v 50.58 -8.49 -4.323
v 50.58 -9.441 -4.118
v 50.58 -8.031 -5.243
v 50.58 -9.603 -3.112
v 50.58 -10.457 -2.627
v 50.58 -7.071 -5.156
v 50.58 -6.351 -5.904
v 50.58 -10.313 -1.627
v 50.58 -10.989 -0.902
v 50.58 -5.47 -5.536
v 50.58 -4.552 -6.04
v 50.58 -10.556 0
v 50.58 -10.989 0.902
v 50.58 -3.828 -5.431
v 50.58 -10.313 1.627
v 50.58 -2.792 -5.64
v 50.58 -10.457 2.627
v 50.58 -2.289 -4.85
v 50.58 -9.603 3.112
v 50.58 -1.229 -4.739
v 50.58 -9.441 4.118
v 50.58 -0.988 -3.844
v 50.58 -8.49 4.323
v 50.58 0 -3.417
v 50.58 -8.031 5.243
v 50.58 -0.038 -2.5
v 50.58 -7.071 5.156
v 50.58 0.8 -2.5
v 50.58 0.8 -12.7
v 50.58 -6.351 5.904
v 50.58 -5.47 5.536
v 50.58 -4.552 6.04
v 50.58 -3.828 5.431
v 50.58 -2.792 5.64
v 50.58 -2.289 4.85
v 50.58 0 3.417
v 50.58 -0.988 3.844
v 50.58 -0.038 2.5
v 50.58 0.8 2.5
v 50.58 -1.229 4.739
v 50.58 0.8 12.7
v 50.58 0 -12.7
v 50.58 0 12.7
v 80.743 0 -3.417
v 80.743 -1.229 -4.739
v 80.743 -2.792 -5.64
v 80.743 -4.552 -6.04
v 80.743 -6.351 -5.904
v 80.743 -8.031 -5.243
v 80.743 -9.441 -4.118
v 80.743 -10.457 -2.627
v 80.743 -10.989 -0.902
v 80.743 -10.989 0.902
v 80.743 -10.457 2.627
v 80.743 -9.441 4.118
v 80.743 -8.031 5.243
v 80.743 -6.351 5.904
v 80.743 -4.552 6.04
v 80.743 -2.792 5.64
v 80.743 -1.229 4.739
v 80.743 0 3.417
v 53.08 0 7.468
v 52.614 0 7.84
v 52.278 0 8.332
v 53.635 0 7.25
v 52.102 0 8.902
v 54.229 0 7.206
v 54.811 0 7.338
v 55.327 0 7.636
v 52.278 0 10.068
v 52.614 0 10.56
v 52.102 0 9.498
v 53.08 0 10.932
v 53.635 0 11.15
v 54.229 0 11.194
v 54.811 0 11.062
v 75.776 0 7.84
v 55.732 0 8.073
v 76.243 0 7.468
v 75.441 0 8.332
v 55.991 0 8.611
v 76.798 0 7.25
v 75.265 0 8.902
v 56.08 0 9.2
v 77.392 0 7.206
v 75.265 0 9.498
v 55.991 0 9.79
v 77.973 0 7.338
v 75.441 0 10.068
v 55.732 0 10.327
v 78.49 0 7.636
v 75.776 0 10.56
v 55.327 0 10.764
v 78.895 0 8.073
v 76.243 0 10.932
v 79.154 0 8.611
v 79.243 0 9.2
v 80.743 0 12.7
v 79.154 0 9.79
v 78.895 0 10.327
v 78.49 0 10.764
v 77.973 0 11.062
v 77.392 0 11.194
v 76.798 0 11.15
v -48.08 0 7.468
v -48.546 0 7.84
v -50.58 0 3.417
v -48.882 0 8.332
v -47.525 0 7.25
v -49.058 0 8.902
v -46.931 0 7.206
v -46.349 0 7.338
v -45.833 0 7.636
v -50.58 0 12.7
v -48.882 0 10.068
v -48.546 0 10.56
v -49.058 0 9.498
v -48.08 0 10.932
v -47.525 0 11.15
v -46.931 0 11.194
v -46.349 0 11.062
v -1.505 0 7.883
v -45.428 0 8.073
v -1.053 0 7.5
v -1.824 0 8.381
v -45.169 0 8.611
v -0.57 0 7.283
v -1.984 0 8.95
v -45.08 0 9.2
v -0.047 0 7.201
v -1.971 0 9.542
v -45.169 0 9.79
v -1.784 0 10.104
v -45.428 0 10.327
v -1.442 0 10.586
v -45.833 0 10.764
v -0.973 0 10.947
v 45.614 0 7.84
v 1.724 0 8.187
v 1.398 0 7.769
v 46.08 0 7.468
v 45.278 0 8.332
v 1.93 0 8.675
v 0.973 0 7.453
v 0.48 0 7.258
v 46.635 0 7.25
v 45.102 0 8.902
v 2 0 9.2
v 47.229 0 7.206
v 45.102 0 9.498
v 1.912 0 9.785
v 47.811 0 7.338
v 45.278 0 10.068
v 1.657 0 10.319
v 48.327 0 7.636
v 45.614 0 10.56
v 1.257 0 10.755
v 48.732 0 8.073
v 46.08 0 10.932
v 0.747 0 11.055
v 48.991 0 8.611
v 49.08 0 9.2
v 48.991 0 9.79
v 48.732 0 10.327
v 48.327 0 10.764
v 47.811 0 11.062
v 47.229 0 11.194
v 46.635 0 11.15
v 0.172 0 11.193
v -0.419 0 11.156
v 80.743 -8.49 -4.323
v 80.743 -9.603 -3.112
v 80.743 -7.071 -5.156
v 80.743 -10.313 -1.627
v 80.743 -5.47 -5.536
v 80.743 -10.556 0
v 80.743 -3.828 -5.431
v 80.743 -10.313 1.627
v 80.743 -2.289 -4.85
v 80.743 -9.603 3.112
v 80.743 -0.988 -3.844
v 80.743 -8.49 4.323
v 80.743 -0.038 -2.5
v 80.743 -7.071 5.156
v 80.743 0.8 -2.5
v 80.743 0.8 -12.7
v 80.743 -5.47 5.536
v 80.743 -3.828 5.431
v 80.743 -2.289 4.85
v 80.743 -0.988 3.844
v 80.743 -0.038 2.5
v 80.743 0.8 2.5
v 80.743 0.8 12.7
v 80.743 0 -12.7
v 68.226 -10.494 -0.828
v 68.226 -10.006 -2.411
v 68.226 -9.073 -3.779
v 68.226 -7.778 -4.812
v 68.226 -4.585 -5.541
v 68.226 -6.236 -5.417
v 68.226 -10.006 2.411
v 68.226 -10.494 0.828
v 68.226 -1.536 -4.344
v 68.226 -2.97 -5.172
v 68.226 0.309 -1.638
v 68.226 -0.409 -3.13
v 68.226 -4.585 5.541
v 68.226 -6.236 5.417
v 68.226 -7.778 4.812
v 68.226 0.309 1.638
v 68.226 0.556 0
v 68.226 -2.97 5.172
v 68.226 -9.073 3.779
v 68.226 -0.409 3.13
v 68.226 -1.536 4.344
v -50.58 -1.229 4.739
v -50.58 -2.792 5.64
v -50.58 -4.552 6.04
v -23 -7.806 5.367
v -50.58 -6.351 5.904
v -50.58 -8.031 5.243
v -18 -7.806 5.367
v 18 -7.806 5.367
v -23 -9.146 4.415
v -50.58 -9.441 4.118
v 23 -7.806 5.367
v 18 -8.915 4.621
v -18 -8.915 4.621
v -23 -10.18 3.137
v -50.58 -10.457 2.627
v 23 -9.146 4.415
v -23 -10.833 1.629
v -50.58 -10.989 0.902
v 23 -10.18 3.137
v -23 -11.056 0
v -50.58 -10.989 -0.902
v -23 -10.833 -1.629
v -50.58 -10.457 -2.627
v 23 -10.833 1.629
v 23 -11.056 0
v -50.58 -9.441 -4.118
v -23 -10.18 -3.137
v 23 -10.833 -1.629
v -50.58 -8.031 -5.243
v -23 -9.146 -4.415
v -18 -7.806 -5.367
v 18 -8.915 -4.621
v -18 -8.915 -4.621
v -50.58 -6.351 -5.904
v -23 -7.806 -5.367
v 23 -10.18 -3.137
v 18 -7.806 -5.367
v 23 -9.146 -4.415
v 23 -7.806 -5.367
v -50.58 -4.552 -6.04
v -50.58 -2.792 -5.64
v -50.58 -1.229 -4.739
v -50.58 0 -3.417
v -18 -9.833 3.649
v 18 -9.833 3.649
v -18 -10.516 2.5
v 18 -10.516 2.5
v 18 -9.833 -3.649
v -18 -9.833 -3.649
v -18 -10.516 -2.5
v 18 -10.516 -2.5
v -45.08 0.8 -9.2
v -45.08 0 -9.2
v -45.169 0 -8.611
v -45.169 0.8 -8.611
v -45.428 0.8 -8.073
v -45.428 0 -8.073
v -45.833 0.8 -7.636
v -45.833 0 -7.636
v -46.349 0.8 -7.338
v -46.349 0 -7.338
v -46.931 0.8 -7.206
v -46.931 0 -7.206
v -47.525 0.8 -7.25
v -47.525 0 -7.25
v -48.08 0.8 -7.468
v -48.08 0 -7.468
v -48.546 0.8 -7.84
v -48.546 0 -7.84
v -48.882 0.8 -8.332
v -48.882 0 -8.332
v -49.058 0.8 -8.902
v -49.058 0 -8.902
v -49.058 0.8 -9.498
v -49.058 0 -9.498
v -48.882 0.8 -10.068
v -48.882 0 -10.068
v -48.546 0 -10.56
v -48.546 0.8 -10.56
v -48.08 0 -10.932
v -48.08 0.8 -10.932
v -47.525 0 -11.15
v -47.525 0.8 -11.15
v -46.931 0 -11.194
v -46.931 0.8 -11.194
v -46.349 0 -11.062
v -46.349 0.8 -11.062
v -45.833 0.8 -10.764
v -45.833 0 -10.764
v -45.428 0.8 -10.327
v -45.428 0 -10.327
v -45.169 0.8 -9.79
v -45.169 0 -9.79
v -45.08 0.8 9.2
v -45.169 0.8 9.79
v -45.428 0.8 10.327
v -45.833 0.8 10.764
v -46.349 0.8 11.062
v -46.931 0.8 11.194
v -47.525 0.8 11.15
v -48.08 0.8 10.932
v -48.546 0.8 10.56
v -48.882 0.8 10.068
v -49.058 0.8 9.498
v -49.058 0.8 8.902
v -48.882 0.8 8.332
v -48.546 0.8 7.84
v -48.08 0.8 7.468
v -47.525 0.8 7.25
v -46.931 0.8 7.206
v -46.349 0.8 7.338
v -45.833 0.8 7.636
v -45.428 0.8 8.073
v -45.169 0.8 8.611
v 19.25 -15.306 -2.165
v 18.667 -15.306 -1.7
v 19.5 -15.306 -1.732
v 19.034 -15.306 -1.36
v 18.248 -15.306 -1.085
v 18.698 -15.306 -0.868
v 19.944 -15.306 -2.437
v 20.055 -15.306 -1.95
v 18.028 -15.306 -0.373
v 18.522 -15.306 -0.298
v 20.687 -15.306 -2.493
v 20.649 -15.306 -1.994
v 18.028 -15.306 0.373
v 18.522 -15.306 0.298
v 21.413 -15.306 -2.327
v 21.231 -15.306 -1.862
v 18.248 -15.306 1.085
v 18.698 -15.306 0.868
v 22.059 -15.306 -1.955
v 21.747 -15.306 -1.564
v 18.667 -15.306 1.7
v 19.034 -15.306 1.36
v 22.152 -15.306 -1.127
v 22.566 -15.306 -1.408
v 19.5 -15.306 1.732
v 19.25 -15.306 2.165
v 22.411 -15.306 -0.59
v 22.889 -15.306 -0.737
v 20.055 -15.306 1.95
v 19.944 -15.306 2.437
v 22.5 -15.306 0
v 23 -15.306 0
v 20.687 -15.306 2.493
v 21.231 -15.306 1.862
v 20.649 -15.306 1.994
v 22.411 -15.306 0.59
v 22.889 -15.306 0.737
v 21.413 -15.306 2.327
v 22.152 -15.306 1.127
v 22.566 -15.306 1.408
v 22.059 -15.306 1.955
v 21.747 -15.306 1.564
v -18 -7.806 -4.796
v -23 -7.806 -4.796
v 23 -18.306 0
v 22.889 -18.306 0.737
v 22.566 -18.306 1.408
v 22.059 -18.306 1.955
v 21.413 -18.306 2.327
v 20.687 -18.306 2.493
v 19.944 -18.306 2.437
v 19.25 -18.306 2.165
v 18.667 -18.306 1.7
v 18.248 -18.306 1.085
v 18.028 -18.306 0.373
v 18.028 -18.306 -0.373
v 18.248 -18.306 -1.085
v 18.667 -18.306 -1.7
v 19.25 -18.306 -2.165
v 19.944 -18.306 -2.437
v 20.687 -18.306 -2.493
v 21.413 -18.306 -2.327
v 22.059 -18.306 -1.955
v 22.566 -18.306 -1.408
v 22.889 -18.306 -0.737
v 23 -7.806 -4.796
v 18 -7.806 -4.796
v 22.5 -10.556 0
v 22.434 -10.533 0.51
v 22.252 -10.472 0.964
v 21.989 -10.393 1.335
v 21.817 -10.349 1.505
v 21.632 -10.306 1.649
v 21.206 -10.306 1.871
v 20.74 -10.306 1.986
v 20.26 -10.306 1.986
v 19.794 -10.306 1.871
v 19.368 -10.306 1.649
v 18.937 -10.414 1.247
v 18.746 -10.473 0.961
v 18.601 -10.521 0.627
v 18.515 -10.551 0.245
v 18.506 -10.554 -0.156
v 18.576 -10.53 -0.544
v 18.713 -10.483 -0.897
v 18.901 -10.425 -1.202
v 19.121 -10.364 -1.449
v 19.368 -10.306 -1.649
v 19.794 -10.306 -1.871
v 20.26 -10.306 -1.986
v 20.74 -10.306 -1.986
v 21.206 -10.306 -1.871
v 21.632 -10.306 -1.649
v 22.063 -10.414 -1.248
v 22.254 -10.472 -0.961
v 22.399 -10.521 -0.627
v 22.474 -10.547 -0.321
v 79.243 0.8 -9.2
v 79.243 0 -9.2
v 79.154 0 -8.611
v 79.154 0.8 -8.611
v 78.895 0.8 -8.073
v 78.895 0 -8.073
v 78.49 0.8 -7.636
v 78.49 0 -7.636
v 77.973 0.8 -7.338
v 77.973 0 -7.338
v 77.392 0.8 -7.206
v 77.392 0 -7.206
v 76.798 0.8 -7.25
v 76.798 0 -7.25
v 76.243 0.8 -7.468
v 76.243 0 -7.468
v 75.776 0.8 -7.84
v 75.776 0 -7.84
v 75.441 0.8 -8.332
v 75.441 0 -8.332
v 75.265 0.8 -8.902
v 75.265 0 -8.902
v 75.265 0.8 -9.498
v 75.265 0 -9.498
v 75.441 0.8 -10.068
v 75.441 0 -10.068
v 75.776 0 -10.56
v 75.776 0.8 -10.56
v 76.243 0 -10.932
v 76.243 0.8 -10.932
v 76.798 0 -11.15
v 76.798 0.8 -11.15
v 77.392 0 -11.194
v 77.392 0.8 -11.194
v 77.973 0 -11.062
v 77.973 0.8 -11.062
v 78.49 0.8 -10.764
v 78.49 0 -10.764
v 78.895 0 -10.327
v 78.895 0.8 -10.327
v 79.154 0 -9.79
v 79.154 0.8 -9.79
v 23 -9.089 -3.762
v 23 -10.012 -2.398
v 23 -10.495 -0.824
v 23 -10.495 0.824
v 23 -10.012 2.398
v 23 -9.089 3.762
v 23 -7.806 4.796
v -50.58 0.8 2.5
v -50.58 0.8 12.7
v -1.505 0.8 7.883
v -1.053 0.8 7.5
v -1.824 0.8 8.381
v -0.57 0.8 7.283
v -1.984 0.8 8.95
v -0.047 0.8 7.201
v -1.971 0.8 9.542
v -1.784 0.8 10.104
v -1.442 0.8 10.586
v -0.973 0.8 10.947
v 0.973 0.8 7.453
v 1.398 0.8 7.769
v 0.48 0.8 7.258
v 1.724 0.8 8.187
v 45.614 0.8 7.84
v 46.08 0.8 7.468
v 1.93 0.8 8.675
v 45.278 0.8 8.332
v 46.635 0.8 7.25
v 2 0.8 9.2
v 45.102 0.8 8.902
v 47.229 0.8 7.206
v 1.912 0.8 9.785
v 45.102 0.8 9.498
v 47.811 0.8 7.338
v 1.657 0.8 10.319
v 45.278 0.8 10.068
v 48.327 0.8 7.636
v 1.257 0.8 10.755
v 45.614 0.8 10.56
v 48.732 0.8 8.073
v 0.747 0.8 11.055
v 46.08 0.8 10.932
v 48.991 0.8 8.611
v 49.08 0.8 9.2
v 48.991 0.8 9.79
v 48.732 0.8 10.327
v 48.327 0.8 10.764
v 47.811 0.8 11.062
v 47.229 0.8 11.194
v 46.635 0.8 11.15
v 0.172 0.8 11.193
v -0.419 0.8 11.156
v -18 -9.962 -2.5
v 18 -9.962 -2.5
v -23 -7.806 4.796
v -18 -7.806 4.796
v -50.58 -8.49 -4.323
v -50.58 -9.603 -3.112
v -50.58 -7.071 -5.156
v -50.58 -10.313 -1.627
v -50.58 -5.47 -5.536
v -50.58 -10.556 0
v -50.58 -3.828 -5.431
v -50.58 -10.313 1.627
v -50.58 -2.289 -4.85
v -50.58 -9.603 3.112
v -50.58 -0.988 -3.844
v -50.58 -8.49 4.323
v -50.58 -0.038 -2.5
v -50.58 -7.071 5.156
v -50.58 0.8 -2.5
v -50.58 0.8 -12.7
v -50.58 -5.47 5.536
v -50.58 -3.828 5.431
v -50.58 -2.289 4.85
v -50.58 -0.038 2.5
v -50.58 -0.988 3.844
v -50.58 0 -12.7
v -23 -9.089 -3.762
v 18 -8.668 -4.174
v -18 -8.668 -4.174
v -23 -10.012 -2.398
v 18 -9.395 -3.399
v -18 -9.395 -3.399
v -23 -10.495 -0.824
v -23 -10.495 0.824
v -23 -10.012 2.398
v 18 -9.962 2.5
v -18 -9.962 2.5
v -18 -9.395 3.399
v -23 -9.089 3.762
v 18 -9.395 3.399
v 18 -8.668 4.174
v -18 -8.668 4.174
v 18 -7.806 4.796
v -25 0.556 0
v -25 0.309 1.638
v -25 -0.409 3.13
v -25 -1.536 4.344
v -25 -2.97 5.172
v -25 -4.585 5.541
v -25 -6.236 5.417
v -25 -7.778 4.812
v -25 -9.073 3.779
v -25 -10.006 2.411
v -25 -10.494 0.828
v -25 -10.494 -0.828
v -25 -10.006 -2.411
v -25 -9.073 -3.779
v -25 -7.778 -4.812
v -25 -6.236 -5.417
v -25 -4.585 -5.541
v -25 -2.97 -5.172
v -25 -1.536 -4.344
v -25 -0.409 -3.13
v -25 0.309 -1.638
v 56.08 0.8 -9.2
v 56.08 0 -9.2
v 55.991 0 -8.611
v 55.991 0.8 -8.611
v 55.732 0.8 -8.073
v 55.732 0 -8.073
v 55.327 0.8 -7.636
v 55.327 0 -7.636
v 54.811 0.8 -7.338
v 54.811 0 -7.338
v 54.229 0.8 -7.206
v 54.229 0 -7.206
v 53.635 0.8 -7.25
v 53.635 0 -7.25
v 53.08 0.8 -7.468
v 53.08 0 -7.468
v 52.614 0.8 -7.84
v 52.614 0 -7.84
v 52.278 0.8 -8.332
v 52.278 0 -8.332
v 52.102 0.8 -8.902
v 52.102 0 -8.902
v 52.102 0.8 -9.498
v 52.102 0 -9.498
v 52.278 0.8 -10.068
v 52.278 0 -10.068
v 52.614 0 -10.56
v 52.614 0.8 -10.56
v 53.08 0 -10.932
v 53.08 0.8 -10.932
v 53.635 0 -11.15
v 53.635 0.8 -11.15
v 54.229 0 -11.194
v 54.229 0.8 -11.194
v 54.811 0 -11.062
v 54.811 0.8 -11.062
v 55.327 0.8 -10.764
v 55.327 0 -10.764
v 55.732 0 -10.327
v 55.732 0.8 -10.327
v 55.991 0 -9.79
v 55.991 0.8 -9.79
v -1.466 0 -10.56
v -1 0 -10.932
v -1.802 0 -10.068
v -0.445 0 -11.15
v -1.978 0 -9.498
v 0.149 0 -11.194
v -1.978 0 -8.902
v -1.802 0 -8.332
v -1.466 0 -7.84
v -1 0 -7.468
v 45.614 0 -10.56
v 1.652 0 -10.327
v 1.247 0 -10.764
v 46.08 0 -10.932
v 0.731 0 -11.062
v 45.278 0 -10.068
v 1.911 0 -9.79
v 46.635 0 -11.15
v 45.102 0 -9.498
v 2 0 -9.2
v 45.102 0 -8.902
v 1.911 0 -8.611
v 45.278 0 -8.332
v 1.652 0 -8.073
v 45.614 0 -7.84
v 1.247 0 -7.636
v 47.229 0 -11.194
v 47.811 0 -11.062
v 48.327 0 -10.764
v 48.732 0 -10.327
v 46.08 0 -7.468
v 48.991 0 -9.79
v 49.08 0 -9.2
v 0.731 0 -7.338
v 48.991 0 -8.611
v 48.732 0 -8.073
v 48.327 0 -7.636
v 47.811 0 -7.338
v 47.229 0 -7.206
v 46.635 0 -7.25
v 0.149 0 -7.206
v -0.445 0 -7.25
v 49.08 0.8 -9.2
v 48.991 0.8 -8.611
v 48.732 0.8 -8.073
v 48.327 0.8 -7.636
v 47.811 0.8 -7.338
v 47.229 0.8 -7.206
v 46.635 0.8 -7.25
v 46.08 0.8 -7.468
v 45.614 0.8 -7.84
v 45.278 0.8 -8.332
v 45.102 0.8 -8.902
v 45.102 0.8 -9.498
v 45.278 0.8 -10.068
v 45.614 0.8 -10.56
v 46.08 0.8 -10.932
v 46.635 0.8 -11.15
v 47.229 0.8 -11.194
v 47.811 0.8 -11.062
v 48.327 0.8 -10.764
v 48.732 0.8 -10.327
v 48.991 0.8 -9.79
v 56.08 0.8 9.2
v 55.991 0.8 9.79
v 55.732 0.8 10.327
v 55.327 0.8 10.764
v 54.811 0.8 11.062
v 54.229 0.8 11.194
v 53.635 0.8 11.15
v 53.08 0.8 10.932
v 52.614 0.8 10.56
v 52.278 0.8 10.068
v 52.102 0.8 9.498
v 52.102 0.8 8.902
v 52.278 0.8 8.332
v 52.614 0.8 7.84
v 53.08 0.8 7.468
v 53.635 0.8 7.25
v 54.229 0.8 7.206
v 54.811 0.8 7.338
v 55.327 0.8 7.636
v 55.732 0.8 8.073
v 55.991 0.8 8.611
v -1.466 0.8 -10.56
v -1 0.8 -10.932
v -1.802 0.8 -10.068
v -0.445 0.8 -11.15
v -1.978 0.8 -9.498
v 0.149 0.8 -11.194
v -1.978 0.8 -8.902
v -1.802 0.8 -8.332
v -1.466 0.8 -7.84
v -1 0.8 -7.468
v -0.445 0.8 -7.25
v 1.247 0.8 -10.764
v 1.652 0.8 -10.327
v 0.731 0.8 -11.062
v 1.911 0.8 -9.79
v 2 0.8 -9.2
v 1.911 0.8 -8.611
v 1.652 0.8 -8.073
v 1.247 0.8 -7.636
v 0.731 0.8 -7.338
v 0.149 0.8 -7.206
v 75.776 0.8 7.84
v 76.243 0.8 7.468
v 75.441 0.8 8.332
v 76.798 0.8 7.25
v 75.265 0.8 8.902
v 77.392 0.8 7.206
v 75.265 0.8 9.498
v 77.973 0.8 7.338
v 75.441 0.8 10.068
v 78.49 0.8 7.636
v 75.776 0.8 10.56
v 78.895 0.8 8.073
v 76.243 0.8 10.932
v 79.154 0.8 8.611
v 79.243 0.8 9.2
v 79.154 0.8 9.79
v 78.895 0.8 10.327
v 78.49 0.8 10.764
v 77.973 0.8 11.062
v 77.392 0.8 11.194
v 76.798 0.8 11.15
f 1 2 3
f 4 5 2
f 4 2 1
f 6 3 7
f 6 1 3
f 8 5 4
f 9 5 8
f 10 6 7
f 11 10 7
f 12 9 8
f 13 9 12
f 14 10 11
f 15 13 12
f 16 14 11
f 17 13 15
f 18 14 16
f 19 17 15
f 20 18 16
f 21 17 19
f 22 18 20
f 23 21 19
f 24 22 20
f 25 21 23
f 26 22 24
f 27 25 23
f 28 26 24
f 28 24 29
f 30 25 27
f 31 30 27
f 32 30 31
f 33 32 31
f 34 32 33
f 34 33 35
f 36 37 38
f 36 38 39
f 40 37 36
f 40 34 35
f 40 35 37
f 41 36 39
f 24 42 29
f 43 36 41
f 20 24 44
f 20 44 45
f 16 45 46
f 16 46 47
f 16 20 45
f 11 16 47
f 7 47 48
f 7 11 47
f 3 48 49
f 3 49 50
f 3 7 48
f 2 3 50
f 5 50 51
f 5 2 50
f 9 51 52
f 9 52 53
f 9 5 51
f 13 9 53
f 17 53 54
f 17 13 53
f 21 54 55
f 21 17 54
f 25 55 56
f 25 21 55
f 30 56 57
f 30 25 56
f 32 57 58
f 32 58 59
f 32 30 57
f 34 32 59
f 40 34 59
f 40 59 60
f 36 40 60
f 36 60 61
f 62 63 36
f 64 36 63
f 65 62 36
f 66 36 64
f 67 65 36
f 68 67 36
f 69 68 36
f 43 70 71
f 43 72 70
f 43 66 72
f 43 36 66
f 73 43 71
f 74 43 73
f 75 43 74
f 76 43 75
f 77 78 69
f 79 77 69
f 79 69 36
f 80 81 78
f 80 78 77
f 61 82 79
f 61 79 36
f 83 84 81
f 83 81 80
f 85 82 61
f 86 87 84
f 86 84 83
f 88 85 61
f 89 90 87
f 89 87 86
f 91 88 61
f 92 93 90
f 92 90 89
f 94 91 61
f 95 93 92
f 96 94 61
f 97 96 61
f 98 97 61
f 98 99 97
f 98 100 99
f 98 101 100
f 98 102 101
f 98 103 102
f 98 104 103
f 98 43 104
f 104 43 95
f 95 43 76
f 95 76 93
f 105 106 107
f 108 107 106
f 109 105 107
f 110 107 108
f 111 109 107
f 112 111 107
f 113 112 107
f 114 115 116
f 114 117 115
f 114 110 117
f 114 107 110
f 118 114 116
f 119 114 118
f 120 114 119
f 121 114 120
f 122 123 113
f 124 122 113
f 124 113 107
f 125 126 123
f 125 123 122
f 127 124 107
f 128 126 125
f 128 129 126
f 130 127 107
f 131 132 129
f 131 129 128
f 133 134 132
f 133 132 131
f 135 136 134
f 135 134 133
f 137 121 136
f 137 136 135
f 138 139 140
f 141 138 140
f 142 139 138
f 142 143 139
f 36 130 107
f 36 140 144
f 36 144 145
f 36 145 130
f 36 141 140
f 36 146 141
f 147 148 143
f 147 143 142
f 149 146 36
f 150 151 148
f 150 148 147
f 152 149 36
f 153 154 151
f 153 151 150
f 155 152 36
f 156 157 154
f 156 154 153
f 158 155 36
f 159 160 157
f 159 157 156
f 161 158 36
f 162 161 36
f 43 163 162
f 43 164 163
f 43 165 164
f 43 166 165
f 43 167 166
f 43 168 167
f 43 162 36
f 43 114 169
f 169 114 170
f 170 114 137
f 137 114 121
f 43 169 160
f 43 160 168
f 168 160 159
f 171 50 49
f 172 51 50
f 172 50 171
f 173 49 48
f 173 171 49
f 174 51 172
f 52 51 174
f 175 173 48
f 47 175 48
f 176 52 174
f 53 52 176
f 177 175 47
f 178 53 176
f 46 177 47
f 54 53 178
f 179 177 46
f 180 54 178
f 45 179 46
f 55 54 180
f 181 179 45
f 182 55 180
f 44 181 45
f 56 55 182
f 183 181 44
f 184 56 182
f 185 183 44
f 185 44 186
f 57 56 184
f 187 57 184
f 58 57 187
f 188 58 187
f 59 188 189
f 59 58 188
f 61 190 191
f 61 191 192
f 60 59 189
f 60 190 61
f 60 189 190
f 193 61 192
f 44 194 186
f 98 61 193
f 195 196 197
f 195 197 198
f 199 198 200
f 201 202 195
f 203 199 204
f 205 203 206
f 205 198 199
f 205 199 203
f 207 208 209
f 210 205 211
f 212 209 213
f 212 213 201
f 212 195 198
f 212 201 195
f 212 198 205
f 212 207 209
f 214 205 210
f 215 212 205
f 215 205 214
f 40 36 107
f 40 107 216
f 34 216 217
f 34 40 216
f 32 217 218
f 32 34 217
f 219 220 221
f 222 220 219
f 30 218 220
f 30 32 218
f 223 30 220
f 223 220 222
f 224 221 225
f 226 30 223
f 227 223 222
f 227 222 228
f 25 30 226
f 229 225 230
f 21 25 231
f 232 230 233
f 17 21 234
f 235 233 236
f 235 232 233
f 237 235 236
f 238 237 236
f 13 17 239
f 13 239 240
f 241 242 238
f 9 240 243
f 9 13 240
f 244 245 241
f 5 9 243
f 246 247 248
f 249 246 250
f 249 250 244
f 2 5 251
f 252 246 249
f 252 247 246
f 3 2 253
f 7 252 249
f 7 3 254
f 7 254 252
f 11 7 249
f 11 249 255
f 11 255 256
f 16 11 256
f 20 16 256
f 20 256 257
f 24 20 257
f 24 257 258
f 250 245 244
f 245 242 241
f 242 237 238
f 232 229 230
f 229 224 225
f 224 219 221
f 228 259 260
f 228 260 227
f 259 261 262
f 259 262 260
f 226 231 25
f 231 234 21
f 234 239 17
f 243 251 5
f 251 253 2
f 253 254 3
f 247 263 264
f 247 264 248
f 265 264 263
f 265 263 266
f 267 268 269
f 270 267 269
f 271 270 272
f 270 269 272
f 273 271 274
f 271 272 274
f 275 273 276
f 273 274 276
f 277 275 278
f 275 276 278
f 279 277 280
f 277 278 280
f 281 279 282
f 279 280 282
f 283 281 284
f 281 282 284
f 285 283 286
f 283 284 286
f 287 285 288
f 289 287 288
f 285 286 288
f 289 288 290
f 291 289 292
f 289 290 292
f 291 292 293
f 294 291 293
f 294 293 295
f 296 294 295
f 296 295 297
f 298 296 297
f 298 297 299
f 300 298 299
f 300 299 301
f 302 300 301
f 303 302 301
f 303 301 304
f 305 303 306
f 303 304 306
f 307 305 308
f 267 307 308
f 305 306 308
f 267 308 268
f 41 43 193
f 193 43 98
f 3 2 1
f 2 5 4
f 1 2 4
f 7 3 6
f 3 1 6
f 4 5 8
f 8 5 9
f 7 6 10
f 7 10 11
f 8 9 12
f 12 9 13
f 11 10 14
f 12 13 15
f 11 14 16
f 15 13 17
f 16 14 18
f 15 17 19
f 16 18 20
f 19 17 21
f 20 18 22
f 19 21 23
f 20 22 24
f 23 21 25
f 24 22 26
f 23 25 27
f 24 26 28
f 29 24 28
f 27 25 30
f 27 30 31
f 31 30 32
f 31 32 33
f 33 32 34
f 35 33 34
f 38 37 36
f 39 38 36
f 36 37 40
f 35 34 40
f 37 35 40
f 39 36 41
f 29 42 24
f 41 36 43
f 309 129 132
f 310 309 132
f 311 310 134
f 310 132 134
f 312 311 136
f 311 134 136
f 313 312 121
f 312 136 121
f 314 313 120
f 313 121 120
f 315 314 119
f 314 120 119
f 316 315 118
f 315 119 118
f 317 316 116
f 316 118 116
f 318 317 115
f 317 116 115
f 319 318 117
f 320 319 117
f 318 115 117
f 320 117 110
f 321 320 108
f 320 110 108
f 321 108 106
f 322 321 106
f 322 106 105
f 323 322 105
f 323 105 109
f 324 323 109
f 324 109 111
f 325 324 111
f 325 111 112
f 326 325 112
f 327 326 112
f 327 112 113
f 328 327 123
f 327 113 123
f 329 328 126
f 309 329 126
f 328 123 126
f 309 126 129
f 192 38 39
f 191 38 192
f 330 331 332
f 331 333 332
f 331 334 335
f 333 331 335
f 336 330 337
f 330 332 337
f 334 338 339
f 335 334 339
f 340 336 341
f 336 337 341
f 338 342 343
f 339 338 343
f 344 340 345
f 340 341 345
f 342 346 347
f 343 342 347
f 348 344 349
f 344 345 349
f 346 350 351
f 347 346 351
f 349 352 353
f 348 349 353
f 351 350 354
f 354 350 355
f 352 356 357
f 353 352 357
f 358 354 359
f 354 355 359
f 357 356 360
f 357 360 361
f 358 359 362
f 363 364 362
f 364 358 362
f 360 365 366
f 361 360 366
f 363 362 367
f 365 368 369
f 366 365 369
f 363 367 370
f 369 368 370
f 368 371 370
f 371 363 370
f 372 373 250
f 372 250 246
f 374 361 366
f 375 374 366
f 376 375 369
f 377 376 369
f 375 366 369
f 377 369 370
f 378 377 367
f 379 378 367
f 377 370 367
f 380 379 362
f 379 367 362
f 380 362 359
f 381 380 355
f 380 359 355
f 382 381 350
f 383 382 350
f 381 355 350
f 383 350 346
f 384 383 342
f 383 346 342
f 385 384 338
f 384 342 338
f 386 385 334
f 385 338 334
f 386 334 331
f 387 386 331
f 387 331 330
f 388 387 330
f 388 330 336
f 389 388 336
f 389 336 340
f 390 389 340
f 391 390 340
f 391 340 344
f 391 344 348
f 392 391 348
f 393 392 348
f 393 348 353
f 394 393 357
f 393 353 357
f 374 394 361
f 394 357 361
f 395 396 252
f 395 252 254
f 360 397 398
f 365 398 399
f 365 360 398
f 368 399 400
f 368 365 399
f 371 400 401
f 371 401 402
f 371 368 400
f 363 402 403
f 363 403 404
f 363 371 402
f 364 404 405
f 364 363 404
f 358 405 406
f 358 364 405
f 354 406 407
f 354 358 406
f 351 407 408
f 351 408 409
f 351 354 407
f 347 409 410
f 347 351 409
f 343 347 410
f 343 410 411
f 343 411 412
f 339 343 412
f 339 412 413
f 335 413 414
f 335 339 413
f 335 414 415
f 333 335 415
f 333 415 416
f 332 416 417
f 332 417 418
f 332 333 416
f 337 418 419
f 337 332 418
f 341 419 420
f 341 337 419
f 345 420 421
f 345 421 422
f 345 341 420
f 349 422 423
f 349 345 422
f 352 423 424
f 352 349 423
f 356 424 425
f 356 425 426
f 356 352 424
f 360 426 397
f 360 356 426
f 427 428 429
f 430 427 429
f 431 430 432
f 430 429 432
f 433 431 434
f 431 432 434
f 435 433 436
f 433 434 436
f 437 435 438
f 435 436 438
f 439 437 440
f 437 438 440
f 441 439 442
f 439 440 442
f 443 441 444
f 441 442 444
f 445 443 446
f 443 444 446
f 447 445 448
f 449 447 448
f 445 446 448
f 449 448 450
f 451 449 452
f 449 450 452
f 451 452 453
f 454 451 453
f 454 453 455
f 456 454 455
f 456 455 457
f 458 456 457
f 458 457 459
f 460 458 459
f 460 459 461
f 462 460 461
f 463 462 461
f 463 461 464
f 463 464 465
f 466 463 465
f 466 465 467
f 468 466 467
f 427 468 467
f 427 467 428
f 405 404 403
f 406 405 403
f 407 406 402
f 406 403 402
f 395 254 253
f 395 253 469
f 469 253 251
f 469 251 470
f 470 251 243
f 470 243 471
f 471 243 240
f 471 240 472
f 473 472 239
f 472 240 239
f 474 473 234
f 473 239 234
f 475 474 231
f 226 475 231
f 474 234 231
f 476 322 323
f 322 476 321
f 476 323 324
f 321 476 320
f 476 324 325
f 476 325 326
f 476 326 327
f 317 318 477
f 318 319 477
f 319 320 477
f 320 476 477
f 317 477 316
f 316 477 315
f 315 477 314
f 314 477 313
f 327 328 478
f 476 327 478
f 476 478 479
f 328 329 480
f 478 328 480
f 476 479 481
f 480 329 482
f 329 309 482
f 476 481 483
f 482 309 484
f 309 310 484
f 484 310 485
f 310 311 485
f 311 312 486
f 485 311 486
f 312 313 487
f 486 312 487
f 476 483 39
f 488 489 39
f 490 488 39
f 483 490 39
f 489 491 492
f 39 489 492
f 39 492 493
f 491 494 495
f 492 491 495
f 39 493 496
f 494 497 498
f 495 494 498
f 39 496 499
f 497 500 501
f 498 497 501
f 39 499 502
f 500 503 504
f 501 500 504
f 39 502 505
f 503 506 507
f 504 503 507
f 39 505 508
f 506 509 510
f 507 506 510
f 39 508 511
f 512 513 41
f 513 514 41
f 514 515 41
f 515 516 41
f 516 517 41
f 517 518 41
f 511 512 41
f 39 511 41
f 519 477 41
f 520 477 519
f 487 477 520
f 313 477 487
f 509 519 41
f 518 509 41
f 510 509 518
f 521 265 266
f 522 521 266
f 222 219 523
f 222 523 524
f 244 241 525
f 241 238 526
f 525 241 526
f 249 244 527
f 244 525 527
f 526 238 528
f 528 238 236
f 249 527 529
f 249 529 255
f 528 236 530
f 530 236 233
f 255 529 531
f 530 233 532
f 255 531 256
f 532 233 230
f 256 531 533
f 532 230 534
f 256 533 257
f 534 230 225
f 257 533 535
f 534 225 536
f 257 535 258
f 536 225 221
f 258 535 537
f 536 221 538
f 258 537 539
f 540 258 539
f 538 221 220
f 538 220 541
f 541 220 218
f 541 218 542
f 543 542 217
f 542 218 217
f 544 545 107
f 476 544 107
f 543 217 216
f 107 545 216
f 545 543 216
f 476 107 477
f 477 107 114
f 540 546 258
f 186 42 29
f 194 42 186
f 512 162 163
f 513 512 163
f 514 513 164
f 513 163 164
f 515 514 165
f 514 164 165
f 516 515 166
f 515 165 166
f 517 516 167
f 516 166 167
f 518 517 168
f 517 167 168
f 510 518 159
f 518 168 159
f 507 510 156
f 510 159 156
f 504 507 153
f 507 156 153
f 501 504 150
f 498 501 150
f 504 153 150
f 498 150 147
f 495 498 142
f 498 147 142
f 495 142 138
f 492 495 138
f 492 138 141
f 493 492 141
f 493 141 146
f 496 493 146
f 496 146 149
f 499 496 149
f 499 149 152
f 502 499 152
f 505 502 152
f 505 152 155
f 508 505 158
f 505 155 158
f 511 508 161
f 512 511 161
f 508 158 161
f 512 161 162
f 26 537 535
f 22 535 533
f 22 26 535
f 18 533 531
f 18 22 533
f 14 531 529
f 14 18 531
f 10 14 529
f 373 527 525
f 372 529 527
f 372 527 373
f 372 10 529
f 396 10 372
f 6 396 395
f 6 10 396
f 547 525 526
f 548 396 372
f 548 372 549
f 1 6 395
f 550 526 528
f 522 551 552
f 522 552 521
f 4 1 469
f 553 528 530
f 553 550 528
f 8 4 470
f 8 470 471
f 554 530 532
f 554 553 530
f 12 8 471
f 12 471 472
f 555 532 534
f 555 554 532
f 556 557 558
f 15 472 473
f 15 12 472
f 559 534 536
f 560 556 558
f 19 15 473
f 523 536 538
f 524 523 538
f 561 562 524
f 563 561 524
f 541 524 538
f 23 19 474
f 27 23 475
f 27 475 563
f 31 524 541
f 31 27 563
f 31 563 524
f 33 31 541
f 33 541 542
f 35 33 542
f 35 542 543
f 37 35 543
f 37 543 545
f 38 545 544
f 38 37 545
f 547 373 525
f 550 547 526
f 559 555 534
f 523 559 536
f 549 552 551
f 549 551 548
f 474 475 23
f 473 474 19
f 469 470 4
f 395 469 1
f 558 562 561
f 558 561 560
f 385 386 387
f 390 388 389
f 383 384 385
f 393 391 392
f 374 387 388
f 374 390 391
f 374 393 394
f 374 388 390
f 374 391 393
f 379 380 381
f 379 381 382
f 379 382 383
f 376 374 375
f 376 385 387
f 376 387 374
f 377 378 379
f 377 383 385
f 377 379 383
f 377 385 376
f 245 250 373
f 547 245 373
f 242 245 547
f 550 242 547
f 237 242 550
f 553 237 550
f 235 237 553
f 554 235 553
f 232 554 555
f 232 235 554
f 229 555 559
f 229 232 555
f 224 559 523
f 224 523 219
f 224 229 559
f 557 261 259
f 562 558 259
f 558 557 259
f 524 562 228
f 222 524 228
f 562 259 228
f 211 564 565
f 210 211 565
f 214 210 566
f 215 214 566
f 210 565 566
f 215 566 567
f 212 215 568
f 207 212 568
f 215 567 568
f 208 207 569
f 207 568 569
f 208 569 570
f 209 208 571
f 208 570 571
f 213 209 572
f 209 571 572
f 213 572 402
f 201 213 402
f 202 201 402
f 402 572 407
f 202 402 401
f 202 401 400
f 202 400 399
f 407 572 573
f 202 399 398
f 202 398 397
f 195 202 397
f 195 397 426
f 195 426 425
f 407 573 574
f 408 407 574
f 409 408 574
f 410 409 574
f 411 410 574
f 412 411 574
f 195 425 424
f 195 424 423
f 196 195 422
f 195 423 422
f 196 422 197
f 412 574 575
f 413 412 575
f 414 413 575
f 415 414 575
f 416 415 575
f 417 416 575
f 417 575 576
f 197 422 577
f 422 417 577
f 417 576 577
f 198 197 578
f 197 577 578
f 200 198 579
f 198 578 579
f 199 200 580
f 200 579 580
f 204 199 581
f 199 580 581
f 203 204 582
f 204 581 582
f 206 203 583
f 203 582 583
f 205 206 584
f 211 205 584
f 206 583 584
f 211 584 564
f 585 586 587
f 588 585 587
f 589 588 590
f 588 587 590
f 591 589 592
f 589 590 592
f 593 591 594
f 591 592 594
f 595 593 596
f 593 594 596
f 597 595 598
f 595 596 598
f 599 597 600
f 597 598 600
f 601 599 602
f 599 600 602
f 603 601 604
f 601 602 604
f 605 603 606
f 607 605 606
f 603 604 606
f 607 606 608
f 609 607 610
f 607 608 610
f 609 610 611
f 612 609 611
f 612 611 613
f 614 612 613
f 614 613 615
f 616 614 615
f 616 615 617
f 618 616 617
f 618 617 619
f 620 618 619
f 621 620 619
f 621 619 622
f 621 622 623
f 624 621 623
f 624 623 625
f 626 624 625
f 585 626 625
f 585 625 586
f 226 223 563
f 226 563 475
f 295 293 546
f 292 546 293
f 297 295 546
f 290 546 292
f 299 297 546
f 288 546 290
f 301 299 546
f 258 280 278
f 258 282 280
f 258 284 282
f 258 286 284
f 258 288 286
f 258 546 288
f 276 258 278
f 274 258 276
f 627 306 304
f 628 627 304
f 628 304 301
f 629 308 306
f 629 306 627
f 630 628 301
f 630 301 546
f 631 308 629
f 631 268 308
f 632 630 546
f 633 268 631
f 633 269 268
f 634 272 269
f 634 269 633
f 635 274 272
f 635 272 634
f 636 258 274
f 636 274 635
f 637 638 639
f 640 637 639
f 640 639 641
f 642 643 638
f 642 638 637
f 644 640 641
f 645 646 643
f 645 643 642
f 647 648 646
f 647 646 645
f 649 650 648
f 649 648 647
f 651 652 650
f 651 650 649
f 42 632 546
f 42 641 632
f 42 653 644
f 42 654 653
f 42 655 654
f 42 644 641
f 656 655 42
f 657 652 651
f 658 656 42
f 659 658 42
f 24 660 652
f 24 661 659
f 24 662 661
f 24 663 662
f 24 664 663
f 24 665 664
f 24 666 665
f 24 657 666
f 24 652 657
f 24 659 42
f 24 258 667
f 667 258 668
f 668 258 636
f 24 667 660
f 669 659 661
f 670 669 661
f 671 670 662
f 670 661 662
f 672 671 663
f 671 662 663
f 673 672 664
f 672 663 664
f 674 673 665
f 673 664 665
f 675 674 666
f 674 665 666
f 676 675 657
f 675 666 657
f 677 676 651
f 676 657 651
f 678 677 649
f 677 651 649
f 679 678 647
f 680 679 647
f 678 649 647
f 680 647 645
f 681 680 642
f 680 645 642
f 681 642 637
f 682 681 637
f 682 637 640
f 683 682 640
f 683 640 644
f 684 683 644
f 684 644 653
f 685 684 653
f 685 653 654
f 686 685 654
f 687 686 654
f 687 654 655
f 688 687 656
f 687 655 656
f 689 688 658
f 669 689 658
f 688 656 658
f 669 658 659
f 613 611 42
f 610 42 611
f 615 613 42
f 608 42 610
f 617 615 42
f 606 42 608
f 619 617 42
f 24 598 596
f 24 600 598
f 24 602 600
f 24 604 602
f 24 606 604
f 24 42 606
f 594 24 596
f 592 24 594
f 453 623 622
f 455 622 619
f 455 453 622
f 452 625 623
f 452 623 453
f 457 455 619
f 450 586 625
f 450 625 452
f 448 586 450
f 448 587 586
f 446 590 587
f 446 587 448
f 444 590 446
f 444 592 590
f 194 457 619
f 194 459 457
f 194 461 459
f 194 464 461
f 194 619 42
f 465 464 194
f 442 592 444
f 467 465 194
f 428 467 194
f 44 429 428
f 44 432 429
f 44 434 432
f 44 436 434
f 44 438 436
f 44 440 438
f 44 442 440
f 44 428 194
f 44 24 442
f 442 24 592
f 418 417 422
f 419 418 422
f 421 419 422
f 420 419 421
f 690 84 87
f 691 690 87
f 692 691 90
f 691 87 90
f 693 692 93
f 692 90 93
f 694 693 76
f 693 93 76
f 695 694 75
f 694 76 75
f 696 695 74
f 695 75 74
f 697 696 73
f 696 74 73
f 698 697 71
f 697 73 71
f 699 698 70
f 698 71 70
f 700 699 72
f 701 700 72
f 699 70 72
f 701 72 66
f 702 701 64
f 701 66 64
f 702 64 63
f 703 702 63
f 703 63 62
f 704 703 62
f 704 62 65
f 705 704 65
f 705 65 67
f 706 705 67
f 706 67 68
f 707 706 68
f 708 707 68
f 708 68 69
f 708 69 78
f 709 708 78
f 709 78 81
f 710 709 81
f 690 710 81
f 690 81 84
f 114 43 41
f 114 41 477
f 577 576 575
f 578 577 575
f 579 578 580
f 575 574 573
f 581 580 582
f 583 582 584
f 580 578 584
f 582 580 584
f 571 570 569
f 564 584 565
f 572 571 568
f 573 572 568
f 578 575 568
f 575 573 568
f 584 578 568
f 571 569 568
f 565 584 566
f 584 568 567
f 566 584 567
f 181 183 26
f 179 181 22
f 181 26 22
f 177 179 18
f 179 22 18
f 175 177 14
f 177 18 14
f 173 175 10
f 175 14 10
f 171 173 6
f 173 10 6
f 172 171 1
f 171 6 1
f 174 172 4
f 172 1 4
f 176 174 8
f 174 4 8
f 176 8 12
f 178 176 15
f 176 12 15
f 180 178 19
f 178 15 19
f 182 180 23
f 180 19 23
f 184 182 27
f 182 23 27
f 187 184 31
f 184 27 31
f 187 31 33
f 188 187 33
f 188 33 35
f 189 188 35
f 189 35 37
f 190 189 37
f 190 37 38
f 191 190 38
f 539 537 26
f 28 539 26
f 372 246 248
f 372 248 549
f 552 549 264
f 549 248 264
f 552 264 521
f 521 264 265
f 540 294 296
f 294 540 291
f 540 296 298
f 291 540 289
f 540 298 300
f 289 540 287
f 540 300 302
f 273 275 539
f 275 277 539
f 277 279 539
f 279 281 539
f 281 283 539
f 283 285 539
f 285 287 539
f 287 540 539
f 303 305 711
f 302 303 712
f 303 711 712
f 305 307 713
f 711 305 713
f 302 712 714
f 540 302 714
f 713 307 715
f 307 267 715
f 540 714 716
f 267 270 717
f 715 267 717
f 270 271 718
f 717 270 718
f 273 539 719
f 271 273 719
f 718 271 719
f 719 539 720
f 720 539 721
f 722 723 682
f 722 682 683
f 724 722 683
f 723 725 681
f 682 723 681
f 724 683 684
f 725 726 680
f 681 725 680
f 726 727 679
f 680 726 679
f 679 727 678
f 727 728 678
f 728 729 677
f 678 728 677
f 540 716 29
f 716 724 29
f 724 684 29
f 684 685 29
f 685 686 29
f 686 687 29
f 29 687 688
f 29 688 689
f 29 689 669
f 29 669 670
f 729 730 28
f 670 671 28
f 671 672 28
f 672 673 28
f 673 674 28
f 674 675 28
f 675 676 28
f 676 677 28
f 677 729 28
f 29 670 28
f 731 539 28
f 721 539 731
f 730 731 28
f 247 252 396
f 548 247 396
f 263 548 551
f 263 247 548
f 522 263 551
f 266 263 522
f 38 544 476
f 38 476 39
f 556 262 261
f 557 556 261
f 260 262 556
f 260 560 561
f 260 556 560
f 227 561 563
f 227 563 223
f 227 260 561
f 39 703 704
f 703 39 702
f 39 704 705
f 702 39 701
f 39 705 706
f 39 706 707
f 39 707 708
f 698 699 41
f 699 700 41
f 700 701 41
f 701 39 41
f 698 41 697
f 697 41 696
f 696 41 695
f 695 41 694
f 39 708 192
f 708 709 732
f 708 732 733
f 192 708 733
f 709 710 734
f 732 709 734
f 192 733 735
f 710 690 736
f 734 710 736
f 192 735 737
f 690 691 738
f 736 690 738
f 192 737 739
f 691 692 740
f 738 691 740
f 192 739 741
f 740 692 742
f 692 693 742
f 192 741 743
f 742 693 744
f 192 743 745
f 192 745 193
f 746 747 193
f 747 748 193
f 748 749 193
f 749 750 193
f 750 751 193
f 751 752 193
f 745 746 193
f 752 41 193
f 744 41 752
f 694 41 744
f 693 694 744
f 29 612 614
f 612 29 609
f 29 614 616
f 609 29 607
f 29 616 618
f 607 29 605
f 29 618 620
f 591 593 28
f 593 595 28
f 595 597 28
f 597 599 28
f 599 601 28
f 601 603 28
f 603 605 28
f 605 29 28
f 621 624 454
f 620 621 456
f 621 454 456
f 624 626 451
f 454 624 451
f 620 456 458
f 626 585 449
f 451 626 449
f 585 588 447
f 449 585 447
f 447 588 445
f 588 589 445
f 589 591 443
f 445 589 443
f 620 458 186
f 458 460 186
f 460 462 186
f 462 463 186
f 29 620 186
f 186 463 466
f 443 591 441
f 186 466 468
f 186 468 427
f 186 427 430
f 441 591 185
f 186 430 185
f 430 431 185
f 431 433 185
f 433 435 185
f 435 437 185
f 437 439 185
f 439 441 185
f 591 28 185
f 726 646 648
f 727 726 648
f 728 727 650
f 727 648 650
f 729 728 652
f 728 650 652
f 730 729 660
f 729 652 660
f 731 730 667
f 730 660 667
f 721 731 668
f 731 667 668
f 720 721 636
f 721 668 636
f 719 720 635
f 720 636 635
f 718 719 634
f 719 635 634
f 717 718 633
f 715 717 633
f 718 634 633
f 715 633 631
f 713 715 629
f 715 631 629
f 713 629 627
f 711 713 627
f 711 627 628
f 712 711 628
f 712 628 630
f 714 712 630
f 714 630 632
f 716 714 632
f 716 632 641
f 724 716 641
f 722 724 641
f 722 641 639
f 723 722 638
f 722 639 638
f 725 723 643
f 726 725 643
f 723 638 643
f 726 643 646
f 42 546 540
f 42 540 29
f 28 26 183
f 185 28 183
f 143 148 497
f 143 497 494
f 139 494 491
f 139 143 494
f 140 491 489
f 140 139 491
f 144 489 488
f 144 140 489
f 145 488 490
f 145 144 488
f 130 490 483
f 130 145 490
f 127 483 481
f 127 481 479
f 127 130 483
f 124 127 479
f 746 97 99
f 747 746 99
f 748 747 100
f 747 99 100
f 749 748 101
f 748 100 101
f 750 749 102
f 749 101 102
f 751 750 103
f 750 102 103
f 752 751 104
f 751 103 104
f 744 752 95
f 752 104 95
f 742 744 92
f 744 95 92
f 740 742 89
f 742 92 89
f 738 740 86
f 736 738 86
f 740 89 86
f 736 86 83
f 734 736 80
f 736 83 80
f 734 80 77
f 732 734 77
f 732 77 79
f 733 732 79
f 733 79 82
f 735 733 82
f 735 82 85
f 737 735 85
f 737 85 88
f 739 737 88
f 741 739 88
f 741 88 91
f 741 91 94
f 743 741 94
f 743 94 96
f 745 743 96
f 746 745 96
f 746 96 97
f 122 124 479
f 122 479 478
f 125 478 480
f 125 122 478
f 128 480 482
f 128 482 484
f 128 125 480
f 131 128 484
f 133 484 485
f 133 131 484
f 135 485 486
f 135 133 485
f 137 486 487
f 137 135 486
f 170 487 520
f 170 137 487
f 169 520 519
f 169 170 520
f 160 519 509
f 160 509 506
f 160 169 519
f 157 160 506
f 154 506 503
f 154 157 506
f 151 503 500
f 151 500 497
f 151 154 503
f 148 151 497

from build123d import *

# Parameters (mm, degrees)
F0_R      = 2
F0_W      = 23
F0_H      = 2.5
F2_DEPTH  = 0.8
F3_DEPTH  = 50.58
F0_W_2    = 30.1626
F0_H_2    = 10.20005
F4_DEPTH  = 0.8
F5_DEPTH  = 30.1626
F6_DEPTH  = 25
F7_DEPTH  = 75
F0_W_3    = 27.58
F0_H_3    = 5
F8_DEPTH  = 2
F10_W     = 5
F10_H     = 5
F11_DEPTH = 5
F12_DEPTH = 25
F13_DEPTH = 50.8
F14_DEPTH = 17.42625
F15_R     = 2
F16_DEPTH = 2.5
F17_R     = 2.5
F17_R_2   = 2.3370450509
F17_R_3   = 2
F18_DEPTH = 3


with BuildPart() as f2:
    # F0 (on Front) → F2 (new body)
    with BuildSketch(Plane.XZ):
        Polygon((50.58, 12.70005), (-50.58, 12.70005), (-50.58, 2.5), (-23, 2.5), (0, 2.5), (23, 2.5), (50.58, 2.5), align=None)
        with Locations((-47.08, 9.20005)):
            Circle(F0_R, mode=Mode.SUBTRACT)
        with BuildLine():
            ThreePointArc((2, 9.20005), (0.9728901826, 7.4526277006), (-1.0534846926, 7.5))
            ThreePointArc((-1.0534846926, 7.5), (-0.9728901826, 10.9474722994), (2, 9.20005))
        make_face(mode=Mode.SUBTRACT)
        with Locations((47.08, 9.20005)):
            Circle(F0_R, mode=Mode.SUBTRACT)
        with Locations((-11.5, -1.25)):
            Rectangle(F0_W, F0_H)
        with Locations((-11.5, 1.25)):
            Rectangle(F0_W, F0_H)
        Polygon((23, -2.5), (23, 2.5), (0, 2.5), (0, 0), (0, -2.5), align=None)
        Polygon((-23, -2.5), (-50.58, -2.5), (-50.58, -12.70005), (50.58, -12.70005), (50.58, -2.5), (23, -2.5), (0, -2.5), align=None)
        with Locations((-47.08, -9.20005)):
            Circle(F0_R, mode=Mode.SUBTRACT)
        with Locations((0, -9.20005)):
            Circle(F0_R, mode=Mode.SUBTRACT)
        with Locations((47.08, -9.20005)):
            Circle(F0_R, mode=Mode.SUBTRACT)
    extrude(amount=-F2_DEPTH)

    # F1 (on Right) → F3 (join, symmetric)
    with BuildSketch(Plane.YZ):
        with BuildLine():
            Line((0.55625, 0), (1.05625, 0))
            ThreePointArc((1.05625, 0), (-5, 6.05625), (-11.05625, 0))
            Line((-11.05625, 0), (-10.55625, 0))
            ThreePointArc((-10.55625, 0), (-5, 5.55625), (0.55625, 0))
        make_face()
        with BuildLine():
            ThreePointArc((-11.05625, 0), (-5, -6.05625), (1.05625, 0))
            Line((1.05625, 0), (0.55625, 0))
            ThreePointArc((0.55625, 0), (-5, -5.55625), (-10.55625, 0))
            Line((-10.55625, 0), (-11.05625, 0))
        make_face()
    extrude(amount=F3_DEPTH, both=True)


with BuildPart() as f4:
    # F0 (on Front) → F4 (new body)
    with BuildSketch(Plane.XZ):
        with Locations((65.6613, 7.600025)):
            Rectangle(F0_W_2, F0_H_2)
        with Locations((54.08, 9.20005)):
            Circle(F0_R, mode=Mode.SUBTRACT)
        with Locations((77.2426, 9.20005)):
            Circle(F0_R, mode=Mode.SUBTRACT)
    extrude(amount=-F4_DEPTH)

    # F5 (add): a face of the model
    f5_faces = [f2.part.faces().sort_by_distance(p)[0] for p in [
        (50.58, 0.2814032225, 8.0586914436),
    ]]


with BuildPart() as f4b:
    # F0 (on Front) → F4, piece 2 (new body)
    with BuildSketch(Plane.XZ):
        with Locations((65.6613, -7.600025)):
            Rectangle(F0_W_2, F0_H_2)
        with Locations((54.08, -9.20005)):
            Circle(F0_R, mode=Mode.SUBTRACT)
        with Locations((77.2426, -9.20005)):
            Circle(F0_R, mode=Mode.SUBTRACT)
    extrude(amount=-F4_DEPTH)


with BuildPart() as f4_1:
    add(f4.part)

    add(f4b.part)  # F5 merges F4b
    extrude(f5_faces, amount=F5_DEPTH)

    # F0 (on Front) → F6 (cut)
    with BuildSketch(Plane.XZ):
        with Locations((54.08, 9.20005)):
            Circle(F0_R)
        with Locations((77.2426, 9.20005)):
            Circle(F0_R)
        with Locations((77.2426, -9.20005)):
            Circle(F0_R)
        with Locations((54.08, -9.20005)):
            Circle(F0_R)
    extrude(amount=-F6_DEPTH, mode=Mode.SUBTRACT)


with BuildPart() as f2_1:
    add(f2.part)

    # F0 (on Front) → F7 (cut, symmetric)
    with BuildSketch(Plane.XZ):
        with Locations((-11.5, -1.25)):
            Rectangle(F0_W, F0_H)
        with Locations((-11.5, 1.25)):
            Rectangle(F0_W, F0_H)
        Polygon((23, -2.5), (23, 2.5), (0, 2.5), (0, 0), (0, -2.5), align=None)
    extrude(amount=F7_DEPTH, both=True, mode=Mode.SUBTRACT)


with BuildPart() as f8_tool:
    # F0 (on Front) → F8 (new body, symmetric)
    with BuildSketch(Plane.XZ):
        Polygon((-23, 2.5), (-50.58, 2.5), (-50.58, -2.5), (-23, -2.5), (-23, 0), align=None)
        with Locations((36.79, 0)):
            Rectangle(F0_W_3, F0_H_3)
        with Locations((65.6613, 0)):
            Rectangle(F0_W_2, F0_H_3)
    extrude(amount=F8_DEPTH, both=True)


with BuildPart() as f2_2:
    add(f2_1.part)

    # F8: cut by f8_tool
    add(f8_tool.part, mode=Mode.SUBTRACT)

    # F10 (on offset) → F11 (cut)
    with BuildSketch(Plane.XZ.offset(12.806)):
        with Locations((-20.5, 5)):
            Rectangle(F10_W, F10_H)
        with Locations((-20.5, -5)):
            Rectangle(F10_W, F10_H)
        with Locations((20.5, 5)):
            Rectangle(F10_W, F10_H)
        with Locations((20.5, -5)):
            Rectangle(F10_W, F10_H)
    extrude(amount=-F11_DEPTH, mode=Mode.SUBTRACT)


with BuildPart() as f4_2:
    add(f4_1.part)

    # F8: cut by f8_tool
    add(f8_tool.part, mode=Mode.SUBTRACT)


with BuildPart() as f12:
    # F1 (on Right) → F12 (new body)
    with BuildSketch(Plane.YZ):
        with BuildLine():
            ThreePointArc((-10.55625, 0), (-5, -5.55625), (0.55625, 0))
            ThreePointArc((0.55625, 0), (-5, 5.55625), (-10.55625, 0))
        make_face()
    extrude(amount=-F12_DEPTH)

    # F1 (on Right) → F13 (join)
    with BuildSketch(Plane.YZ):
        with BuildLine():
            ThreePointArc((-10.55625, 0), (-5, -5.55625), (0.55625, 0))
            ThreePointArc((0.55625, 0), (-5, 5.55625), (-10.55625, 0))
        make_face()
    extrude(amount=F13_DEPTH)

    # F14 (add): a face of the model
    f14_faces = [f12.faces().sort_by_distance(p)[0] for p in [
        (50.8, -5, 0),
    ]]
    extrude(f14_faces, amount=F14_DEPTH)

    # F15 (on offset) → F16 (join, symmetric)
    with BuildSketch(Plane.XZ.offset(12.806)):
        with Locations((20.5, 0)):
            Circle(F15_R)
    extrude(amount=F16_DEPTH, both=True)

    # F17 (on face) → F18 (join)
    with BuildSketch(Plane.XZ.offset(15.306)):
        with Locations((20.5, 0)):
            Circle(F17_R)
        with Locations((20.5, 0)):
            Circle(F17_R_2, mode=Mode.SUBTRACT)
        with Locations((20.5, 0)):
            Circle(F17_R_2)
        with Locations((20.5, 0)):
            Circle(F17_R_3, mode=Mode.SUBTRACT)
        with Locations((20.5, 0)):
            Circle(F17_R_3)
    extrude(amount=F18_DEPTH)


solid = Compound([f2_2.part, f4_2.part, f12.part])
